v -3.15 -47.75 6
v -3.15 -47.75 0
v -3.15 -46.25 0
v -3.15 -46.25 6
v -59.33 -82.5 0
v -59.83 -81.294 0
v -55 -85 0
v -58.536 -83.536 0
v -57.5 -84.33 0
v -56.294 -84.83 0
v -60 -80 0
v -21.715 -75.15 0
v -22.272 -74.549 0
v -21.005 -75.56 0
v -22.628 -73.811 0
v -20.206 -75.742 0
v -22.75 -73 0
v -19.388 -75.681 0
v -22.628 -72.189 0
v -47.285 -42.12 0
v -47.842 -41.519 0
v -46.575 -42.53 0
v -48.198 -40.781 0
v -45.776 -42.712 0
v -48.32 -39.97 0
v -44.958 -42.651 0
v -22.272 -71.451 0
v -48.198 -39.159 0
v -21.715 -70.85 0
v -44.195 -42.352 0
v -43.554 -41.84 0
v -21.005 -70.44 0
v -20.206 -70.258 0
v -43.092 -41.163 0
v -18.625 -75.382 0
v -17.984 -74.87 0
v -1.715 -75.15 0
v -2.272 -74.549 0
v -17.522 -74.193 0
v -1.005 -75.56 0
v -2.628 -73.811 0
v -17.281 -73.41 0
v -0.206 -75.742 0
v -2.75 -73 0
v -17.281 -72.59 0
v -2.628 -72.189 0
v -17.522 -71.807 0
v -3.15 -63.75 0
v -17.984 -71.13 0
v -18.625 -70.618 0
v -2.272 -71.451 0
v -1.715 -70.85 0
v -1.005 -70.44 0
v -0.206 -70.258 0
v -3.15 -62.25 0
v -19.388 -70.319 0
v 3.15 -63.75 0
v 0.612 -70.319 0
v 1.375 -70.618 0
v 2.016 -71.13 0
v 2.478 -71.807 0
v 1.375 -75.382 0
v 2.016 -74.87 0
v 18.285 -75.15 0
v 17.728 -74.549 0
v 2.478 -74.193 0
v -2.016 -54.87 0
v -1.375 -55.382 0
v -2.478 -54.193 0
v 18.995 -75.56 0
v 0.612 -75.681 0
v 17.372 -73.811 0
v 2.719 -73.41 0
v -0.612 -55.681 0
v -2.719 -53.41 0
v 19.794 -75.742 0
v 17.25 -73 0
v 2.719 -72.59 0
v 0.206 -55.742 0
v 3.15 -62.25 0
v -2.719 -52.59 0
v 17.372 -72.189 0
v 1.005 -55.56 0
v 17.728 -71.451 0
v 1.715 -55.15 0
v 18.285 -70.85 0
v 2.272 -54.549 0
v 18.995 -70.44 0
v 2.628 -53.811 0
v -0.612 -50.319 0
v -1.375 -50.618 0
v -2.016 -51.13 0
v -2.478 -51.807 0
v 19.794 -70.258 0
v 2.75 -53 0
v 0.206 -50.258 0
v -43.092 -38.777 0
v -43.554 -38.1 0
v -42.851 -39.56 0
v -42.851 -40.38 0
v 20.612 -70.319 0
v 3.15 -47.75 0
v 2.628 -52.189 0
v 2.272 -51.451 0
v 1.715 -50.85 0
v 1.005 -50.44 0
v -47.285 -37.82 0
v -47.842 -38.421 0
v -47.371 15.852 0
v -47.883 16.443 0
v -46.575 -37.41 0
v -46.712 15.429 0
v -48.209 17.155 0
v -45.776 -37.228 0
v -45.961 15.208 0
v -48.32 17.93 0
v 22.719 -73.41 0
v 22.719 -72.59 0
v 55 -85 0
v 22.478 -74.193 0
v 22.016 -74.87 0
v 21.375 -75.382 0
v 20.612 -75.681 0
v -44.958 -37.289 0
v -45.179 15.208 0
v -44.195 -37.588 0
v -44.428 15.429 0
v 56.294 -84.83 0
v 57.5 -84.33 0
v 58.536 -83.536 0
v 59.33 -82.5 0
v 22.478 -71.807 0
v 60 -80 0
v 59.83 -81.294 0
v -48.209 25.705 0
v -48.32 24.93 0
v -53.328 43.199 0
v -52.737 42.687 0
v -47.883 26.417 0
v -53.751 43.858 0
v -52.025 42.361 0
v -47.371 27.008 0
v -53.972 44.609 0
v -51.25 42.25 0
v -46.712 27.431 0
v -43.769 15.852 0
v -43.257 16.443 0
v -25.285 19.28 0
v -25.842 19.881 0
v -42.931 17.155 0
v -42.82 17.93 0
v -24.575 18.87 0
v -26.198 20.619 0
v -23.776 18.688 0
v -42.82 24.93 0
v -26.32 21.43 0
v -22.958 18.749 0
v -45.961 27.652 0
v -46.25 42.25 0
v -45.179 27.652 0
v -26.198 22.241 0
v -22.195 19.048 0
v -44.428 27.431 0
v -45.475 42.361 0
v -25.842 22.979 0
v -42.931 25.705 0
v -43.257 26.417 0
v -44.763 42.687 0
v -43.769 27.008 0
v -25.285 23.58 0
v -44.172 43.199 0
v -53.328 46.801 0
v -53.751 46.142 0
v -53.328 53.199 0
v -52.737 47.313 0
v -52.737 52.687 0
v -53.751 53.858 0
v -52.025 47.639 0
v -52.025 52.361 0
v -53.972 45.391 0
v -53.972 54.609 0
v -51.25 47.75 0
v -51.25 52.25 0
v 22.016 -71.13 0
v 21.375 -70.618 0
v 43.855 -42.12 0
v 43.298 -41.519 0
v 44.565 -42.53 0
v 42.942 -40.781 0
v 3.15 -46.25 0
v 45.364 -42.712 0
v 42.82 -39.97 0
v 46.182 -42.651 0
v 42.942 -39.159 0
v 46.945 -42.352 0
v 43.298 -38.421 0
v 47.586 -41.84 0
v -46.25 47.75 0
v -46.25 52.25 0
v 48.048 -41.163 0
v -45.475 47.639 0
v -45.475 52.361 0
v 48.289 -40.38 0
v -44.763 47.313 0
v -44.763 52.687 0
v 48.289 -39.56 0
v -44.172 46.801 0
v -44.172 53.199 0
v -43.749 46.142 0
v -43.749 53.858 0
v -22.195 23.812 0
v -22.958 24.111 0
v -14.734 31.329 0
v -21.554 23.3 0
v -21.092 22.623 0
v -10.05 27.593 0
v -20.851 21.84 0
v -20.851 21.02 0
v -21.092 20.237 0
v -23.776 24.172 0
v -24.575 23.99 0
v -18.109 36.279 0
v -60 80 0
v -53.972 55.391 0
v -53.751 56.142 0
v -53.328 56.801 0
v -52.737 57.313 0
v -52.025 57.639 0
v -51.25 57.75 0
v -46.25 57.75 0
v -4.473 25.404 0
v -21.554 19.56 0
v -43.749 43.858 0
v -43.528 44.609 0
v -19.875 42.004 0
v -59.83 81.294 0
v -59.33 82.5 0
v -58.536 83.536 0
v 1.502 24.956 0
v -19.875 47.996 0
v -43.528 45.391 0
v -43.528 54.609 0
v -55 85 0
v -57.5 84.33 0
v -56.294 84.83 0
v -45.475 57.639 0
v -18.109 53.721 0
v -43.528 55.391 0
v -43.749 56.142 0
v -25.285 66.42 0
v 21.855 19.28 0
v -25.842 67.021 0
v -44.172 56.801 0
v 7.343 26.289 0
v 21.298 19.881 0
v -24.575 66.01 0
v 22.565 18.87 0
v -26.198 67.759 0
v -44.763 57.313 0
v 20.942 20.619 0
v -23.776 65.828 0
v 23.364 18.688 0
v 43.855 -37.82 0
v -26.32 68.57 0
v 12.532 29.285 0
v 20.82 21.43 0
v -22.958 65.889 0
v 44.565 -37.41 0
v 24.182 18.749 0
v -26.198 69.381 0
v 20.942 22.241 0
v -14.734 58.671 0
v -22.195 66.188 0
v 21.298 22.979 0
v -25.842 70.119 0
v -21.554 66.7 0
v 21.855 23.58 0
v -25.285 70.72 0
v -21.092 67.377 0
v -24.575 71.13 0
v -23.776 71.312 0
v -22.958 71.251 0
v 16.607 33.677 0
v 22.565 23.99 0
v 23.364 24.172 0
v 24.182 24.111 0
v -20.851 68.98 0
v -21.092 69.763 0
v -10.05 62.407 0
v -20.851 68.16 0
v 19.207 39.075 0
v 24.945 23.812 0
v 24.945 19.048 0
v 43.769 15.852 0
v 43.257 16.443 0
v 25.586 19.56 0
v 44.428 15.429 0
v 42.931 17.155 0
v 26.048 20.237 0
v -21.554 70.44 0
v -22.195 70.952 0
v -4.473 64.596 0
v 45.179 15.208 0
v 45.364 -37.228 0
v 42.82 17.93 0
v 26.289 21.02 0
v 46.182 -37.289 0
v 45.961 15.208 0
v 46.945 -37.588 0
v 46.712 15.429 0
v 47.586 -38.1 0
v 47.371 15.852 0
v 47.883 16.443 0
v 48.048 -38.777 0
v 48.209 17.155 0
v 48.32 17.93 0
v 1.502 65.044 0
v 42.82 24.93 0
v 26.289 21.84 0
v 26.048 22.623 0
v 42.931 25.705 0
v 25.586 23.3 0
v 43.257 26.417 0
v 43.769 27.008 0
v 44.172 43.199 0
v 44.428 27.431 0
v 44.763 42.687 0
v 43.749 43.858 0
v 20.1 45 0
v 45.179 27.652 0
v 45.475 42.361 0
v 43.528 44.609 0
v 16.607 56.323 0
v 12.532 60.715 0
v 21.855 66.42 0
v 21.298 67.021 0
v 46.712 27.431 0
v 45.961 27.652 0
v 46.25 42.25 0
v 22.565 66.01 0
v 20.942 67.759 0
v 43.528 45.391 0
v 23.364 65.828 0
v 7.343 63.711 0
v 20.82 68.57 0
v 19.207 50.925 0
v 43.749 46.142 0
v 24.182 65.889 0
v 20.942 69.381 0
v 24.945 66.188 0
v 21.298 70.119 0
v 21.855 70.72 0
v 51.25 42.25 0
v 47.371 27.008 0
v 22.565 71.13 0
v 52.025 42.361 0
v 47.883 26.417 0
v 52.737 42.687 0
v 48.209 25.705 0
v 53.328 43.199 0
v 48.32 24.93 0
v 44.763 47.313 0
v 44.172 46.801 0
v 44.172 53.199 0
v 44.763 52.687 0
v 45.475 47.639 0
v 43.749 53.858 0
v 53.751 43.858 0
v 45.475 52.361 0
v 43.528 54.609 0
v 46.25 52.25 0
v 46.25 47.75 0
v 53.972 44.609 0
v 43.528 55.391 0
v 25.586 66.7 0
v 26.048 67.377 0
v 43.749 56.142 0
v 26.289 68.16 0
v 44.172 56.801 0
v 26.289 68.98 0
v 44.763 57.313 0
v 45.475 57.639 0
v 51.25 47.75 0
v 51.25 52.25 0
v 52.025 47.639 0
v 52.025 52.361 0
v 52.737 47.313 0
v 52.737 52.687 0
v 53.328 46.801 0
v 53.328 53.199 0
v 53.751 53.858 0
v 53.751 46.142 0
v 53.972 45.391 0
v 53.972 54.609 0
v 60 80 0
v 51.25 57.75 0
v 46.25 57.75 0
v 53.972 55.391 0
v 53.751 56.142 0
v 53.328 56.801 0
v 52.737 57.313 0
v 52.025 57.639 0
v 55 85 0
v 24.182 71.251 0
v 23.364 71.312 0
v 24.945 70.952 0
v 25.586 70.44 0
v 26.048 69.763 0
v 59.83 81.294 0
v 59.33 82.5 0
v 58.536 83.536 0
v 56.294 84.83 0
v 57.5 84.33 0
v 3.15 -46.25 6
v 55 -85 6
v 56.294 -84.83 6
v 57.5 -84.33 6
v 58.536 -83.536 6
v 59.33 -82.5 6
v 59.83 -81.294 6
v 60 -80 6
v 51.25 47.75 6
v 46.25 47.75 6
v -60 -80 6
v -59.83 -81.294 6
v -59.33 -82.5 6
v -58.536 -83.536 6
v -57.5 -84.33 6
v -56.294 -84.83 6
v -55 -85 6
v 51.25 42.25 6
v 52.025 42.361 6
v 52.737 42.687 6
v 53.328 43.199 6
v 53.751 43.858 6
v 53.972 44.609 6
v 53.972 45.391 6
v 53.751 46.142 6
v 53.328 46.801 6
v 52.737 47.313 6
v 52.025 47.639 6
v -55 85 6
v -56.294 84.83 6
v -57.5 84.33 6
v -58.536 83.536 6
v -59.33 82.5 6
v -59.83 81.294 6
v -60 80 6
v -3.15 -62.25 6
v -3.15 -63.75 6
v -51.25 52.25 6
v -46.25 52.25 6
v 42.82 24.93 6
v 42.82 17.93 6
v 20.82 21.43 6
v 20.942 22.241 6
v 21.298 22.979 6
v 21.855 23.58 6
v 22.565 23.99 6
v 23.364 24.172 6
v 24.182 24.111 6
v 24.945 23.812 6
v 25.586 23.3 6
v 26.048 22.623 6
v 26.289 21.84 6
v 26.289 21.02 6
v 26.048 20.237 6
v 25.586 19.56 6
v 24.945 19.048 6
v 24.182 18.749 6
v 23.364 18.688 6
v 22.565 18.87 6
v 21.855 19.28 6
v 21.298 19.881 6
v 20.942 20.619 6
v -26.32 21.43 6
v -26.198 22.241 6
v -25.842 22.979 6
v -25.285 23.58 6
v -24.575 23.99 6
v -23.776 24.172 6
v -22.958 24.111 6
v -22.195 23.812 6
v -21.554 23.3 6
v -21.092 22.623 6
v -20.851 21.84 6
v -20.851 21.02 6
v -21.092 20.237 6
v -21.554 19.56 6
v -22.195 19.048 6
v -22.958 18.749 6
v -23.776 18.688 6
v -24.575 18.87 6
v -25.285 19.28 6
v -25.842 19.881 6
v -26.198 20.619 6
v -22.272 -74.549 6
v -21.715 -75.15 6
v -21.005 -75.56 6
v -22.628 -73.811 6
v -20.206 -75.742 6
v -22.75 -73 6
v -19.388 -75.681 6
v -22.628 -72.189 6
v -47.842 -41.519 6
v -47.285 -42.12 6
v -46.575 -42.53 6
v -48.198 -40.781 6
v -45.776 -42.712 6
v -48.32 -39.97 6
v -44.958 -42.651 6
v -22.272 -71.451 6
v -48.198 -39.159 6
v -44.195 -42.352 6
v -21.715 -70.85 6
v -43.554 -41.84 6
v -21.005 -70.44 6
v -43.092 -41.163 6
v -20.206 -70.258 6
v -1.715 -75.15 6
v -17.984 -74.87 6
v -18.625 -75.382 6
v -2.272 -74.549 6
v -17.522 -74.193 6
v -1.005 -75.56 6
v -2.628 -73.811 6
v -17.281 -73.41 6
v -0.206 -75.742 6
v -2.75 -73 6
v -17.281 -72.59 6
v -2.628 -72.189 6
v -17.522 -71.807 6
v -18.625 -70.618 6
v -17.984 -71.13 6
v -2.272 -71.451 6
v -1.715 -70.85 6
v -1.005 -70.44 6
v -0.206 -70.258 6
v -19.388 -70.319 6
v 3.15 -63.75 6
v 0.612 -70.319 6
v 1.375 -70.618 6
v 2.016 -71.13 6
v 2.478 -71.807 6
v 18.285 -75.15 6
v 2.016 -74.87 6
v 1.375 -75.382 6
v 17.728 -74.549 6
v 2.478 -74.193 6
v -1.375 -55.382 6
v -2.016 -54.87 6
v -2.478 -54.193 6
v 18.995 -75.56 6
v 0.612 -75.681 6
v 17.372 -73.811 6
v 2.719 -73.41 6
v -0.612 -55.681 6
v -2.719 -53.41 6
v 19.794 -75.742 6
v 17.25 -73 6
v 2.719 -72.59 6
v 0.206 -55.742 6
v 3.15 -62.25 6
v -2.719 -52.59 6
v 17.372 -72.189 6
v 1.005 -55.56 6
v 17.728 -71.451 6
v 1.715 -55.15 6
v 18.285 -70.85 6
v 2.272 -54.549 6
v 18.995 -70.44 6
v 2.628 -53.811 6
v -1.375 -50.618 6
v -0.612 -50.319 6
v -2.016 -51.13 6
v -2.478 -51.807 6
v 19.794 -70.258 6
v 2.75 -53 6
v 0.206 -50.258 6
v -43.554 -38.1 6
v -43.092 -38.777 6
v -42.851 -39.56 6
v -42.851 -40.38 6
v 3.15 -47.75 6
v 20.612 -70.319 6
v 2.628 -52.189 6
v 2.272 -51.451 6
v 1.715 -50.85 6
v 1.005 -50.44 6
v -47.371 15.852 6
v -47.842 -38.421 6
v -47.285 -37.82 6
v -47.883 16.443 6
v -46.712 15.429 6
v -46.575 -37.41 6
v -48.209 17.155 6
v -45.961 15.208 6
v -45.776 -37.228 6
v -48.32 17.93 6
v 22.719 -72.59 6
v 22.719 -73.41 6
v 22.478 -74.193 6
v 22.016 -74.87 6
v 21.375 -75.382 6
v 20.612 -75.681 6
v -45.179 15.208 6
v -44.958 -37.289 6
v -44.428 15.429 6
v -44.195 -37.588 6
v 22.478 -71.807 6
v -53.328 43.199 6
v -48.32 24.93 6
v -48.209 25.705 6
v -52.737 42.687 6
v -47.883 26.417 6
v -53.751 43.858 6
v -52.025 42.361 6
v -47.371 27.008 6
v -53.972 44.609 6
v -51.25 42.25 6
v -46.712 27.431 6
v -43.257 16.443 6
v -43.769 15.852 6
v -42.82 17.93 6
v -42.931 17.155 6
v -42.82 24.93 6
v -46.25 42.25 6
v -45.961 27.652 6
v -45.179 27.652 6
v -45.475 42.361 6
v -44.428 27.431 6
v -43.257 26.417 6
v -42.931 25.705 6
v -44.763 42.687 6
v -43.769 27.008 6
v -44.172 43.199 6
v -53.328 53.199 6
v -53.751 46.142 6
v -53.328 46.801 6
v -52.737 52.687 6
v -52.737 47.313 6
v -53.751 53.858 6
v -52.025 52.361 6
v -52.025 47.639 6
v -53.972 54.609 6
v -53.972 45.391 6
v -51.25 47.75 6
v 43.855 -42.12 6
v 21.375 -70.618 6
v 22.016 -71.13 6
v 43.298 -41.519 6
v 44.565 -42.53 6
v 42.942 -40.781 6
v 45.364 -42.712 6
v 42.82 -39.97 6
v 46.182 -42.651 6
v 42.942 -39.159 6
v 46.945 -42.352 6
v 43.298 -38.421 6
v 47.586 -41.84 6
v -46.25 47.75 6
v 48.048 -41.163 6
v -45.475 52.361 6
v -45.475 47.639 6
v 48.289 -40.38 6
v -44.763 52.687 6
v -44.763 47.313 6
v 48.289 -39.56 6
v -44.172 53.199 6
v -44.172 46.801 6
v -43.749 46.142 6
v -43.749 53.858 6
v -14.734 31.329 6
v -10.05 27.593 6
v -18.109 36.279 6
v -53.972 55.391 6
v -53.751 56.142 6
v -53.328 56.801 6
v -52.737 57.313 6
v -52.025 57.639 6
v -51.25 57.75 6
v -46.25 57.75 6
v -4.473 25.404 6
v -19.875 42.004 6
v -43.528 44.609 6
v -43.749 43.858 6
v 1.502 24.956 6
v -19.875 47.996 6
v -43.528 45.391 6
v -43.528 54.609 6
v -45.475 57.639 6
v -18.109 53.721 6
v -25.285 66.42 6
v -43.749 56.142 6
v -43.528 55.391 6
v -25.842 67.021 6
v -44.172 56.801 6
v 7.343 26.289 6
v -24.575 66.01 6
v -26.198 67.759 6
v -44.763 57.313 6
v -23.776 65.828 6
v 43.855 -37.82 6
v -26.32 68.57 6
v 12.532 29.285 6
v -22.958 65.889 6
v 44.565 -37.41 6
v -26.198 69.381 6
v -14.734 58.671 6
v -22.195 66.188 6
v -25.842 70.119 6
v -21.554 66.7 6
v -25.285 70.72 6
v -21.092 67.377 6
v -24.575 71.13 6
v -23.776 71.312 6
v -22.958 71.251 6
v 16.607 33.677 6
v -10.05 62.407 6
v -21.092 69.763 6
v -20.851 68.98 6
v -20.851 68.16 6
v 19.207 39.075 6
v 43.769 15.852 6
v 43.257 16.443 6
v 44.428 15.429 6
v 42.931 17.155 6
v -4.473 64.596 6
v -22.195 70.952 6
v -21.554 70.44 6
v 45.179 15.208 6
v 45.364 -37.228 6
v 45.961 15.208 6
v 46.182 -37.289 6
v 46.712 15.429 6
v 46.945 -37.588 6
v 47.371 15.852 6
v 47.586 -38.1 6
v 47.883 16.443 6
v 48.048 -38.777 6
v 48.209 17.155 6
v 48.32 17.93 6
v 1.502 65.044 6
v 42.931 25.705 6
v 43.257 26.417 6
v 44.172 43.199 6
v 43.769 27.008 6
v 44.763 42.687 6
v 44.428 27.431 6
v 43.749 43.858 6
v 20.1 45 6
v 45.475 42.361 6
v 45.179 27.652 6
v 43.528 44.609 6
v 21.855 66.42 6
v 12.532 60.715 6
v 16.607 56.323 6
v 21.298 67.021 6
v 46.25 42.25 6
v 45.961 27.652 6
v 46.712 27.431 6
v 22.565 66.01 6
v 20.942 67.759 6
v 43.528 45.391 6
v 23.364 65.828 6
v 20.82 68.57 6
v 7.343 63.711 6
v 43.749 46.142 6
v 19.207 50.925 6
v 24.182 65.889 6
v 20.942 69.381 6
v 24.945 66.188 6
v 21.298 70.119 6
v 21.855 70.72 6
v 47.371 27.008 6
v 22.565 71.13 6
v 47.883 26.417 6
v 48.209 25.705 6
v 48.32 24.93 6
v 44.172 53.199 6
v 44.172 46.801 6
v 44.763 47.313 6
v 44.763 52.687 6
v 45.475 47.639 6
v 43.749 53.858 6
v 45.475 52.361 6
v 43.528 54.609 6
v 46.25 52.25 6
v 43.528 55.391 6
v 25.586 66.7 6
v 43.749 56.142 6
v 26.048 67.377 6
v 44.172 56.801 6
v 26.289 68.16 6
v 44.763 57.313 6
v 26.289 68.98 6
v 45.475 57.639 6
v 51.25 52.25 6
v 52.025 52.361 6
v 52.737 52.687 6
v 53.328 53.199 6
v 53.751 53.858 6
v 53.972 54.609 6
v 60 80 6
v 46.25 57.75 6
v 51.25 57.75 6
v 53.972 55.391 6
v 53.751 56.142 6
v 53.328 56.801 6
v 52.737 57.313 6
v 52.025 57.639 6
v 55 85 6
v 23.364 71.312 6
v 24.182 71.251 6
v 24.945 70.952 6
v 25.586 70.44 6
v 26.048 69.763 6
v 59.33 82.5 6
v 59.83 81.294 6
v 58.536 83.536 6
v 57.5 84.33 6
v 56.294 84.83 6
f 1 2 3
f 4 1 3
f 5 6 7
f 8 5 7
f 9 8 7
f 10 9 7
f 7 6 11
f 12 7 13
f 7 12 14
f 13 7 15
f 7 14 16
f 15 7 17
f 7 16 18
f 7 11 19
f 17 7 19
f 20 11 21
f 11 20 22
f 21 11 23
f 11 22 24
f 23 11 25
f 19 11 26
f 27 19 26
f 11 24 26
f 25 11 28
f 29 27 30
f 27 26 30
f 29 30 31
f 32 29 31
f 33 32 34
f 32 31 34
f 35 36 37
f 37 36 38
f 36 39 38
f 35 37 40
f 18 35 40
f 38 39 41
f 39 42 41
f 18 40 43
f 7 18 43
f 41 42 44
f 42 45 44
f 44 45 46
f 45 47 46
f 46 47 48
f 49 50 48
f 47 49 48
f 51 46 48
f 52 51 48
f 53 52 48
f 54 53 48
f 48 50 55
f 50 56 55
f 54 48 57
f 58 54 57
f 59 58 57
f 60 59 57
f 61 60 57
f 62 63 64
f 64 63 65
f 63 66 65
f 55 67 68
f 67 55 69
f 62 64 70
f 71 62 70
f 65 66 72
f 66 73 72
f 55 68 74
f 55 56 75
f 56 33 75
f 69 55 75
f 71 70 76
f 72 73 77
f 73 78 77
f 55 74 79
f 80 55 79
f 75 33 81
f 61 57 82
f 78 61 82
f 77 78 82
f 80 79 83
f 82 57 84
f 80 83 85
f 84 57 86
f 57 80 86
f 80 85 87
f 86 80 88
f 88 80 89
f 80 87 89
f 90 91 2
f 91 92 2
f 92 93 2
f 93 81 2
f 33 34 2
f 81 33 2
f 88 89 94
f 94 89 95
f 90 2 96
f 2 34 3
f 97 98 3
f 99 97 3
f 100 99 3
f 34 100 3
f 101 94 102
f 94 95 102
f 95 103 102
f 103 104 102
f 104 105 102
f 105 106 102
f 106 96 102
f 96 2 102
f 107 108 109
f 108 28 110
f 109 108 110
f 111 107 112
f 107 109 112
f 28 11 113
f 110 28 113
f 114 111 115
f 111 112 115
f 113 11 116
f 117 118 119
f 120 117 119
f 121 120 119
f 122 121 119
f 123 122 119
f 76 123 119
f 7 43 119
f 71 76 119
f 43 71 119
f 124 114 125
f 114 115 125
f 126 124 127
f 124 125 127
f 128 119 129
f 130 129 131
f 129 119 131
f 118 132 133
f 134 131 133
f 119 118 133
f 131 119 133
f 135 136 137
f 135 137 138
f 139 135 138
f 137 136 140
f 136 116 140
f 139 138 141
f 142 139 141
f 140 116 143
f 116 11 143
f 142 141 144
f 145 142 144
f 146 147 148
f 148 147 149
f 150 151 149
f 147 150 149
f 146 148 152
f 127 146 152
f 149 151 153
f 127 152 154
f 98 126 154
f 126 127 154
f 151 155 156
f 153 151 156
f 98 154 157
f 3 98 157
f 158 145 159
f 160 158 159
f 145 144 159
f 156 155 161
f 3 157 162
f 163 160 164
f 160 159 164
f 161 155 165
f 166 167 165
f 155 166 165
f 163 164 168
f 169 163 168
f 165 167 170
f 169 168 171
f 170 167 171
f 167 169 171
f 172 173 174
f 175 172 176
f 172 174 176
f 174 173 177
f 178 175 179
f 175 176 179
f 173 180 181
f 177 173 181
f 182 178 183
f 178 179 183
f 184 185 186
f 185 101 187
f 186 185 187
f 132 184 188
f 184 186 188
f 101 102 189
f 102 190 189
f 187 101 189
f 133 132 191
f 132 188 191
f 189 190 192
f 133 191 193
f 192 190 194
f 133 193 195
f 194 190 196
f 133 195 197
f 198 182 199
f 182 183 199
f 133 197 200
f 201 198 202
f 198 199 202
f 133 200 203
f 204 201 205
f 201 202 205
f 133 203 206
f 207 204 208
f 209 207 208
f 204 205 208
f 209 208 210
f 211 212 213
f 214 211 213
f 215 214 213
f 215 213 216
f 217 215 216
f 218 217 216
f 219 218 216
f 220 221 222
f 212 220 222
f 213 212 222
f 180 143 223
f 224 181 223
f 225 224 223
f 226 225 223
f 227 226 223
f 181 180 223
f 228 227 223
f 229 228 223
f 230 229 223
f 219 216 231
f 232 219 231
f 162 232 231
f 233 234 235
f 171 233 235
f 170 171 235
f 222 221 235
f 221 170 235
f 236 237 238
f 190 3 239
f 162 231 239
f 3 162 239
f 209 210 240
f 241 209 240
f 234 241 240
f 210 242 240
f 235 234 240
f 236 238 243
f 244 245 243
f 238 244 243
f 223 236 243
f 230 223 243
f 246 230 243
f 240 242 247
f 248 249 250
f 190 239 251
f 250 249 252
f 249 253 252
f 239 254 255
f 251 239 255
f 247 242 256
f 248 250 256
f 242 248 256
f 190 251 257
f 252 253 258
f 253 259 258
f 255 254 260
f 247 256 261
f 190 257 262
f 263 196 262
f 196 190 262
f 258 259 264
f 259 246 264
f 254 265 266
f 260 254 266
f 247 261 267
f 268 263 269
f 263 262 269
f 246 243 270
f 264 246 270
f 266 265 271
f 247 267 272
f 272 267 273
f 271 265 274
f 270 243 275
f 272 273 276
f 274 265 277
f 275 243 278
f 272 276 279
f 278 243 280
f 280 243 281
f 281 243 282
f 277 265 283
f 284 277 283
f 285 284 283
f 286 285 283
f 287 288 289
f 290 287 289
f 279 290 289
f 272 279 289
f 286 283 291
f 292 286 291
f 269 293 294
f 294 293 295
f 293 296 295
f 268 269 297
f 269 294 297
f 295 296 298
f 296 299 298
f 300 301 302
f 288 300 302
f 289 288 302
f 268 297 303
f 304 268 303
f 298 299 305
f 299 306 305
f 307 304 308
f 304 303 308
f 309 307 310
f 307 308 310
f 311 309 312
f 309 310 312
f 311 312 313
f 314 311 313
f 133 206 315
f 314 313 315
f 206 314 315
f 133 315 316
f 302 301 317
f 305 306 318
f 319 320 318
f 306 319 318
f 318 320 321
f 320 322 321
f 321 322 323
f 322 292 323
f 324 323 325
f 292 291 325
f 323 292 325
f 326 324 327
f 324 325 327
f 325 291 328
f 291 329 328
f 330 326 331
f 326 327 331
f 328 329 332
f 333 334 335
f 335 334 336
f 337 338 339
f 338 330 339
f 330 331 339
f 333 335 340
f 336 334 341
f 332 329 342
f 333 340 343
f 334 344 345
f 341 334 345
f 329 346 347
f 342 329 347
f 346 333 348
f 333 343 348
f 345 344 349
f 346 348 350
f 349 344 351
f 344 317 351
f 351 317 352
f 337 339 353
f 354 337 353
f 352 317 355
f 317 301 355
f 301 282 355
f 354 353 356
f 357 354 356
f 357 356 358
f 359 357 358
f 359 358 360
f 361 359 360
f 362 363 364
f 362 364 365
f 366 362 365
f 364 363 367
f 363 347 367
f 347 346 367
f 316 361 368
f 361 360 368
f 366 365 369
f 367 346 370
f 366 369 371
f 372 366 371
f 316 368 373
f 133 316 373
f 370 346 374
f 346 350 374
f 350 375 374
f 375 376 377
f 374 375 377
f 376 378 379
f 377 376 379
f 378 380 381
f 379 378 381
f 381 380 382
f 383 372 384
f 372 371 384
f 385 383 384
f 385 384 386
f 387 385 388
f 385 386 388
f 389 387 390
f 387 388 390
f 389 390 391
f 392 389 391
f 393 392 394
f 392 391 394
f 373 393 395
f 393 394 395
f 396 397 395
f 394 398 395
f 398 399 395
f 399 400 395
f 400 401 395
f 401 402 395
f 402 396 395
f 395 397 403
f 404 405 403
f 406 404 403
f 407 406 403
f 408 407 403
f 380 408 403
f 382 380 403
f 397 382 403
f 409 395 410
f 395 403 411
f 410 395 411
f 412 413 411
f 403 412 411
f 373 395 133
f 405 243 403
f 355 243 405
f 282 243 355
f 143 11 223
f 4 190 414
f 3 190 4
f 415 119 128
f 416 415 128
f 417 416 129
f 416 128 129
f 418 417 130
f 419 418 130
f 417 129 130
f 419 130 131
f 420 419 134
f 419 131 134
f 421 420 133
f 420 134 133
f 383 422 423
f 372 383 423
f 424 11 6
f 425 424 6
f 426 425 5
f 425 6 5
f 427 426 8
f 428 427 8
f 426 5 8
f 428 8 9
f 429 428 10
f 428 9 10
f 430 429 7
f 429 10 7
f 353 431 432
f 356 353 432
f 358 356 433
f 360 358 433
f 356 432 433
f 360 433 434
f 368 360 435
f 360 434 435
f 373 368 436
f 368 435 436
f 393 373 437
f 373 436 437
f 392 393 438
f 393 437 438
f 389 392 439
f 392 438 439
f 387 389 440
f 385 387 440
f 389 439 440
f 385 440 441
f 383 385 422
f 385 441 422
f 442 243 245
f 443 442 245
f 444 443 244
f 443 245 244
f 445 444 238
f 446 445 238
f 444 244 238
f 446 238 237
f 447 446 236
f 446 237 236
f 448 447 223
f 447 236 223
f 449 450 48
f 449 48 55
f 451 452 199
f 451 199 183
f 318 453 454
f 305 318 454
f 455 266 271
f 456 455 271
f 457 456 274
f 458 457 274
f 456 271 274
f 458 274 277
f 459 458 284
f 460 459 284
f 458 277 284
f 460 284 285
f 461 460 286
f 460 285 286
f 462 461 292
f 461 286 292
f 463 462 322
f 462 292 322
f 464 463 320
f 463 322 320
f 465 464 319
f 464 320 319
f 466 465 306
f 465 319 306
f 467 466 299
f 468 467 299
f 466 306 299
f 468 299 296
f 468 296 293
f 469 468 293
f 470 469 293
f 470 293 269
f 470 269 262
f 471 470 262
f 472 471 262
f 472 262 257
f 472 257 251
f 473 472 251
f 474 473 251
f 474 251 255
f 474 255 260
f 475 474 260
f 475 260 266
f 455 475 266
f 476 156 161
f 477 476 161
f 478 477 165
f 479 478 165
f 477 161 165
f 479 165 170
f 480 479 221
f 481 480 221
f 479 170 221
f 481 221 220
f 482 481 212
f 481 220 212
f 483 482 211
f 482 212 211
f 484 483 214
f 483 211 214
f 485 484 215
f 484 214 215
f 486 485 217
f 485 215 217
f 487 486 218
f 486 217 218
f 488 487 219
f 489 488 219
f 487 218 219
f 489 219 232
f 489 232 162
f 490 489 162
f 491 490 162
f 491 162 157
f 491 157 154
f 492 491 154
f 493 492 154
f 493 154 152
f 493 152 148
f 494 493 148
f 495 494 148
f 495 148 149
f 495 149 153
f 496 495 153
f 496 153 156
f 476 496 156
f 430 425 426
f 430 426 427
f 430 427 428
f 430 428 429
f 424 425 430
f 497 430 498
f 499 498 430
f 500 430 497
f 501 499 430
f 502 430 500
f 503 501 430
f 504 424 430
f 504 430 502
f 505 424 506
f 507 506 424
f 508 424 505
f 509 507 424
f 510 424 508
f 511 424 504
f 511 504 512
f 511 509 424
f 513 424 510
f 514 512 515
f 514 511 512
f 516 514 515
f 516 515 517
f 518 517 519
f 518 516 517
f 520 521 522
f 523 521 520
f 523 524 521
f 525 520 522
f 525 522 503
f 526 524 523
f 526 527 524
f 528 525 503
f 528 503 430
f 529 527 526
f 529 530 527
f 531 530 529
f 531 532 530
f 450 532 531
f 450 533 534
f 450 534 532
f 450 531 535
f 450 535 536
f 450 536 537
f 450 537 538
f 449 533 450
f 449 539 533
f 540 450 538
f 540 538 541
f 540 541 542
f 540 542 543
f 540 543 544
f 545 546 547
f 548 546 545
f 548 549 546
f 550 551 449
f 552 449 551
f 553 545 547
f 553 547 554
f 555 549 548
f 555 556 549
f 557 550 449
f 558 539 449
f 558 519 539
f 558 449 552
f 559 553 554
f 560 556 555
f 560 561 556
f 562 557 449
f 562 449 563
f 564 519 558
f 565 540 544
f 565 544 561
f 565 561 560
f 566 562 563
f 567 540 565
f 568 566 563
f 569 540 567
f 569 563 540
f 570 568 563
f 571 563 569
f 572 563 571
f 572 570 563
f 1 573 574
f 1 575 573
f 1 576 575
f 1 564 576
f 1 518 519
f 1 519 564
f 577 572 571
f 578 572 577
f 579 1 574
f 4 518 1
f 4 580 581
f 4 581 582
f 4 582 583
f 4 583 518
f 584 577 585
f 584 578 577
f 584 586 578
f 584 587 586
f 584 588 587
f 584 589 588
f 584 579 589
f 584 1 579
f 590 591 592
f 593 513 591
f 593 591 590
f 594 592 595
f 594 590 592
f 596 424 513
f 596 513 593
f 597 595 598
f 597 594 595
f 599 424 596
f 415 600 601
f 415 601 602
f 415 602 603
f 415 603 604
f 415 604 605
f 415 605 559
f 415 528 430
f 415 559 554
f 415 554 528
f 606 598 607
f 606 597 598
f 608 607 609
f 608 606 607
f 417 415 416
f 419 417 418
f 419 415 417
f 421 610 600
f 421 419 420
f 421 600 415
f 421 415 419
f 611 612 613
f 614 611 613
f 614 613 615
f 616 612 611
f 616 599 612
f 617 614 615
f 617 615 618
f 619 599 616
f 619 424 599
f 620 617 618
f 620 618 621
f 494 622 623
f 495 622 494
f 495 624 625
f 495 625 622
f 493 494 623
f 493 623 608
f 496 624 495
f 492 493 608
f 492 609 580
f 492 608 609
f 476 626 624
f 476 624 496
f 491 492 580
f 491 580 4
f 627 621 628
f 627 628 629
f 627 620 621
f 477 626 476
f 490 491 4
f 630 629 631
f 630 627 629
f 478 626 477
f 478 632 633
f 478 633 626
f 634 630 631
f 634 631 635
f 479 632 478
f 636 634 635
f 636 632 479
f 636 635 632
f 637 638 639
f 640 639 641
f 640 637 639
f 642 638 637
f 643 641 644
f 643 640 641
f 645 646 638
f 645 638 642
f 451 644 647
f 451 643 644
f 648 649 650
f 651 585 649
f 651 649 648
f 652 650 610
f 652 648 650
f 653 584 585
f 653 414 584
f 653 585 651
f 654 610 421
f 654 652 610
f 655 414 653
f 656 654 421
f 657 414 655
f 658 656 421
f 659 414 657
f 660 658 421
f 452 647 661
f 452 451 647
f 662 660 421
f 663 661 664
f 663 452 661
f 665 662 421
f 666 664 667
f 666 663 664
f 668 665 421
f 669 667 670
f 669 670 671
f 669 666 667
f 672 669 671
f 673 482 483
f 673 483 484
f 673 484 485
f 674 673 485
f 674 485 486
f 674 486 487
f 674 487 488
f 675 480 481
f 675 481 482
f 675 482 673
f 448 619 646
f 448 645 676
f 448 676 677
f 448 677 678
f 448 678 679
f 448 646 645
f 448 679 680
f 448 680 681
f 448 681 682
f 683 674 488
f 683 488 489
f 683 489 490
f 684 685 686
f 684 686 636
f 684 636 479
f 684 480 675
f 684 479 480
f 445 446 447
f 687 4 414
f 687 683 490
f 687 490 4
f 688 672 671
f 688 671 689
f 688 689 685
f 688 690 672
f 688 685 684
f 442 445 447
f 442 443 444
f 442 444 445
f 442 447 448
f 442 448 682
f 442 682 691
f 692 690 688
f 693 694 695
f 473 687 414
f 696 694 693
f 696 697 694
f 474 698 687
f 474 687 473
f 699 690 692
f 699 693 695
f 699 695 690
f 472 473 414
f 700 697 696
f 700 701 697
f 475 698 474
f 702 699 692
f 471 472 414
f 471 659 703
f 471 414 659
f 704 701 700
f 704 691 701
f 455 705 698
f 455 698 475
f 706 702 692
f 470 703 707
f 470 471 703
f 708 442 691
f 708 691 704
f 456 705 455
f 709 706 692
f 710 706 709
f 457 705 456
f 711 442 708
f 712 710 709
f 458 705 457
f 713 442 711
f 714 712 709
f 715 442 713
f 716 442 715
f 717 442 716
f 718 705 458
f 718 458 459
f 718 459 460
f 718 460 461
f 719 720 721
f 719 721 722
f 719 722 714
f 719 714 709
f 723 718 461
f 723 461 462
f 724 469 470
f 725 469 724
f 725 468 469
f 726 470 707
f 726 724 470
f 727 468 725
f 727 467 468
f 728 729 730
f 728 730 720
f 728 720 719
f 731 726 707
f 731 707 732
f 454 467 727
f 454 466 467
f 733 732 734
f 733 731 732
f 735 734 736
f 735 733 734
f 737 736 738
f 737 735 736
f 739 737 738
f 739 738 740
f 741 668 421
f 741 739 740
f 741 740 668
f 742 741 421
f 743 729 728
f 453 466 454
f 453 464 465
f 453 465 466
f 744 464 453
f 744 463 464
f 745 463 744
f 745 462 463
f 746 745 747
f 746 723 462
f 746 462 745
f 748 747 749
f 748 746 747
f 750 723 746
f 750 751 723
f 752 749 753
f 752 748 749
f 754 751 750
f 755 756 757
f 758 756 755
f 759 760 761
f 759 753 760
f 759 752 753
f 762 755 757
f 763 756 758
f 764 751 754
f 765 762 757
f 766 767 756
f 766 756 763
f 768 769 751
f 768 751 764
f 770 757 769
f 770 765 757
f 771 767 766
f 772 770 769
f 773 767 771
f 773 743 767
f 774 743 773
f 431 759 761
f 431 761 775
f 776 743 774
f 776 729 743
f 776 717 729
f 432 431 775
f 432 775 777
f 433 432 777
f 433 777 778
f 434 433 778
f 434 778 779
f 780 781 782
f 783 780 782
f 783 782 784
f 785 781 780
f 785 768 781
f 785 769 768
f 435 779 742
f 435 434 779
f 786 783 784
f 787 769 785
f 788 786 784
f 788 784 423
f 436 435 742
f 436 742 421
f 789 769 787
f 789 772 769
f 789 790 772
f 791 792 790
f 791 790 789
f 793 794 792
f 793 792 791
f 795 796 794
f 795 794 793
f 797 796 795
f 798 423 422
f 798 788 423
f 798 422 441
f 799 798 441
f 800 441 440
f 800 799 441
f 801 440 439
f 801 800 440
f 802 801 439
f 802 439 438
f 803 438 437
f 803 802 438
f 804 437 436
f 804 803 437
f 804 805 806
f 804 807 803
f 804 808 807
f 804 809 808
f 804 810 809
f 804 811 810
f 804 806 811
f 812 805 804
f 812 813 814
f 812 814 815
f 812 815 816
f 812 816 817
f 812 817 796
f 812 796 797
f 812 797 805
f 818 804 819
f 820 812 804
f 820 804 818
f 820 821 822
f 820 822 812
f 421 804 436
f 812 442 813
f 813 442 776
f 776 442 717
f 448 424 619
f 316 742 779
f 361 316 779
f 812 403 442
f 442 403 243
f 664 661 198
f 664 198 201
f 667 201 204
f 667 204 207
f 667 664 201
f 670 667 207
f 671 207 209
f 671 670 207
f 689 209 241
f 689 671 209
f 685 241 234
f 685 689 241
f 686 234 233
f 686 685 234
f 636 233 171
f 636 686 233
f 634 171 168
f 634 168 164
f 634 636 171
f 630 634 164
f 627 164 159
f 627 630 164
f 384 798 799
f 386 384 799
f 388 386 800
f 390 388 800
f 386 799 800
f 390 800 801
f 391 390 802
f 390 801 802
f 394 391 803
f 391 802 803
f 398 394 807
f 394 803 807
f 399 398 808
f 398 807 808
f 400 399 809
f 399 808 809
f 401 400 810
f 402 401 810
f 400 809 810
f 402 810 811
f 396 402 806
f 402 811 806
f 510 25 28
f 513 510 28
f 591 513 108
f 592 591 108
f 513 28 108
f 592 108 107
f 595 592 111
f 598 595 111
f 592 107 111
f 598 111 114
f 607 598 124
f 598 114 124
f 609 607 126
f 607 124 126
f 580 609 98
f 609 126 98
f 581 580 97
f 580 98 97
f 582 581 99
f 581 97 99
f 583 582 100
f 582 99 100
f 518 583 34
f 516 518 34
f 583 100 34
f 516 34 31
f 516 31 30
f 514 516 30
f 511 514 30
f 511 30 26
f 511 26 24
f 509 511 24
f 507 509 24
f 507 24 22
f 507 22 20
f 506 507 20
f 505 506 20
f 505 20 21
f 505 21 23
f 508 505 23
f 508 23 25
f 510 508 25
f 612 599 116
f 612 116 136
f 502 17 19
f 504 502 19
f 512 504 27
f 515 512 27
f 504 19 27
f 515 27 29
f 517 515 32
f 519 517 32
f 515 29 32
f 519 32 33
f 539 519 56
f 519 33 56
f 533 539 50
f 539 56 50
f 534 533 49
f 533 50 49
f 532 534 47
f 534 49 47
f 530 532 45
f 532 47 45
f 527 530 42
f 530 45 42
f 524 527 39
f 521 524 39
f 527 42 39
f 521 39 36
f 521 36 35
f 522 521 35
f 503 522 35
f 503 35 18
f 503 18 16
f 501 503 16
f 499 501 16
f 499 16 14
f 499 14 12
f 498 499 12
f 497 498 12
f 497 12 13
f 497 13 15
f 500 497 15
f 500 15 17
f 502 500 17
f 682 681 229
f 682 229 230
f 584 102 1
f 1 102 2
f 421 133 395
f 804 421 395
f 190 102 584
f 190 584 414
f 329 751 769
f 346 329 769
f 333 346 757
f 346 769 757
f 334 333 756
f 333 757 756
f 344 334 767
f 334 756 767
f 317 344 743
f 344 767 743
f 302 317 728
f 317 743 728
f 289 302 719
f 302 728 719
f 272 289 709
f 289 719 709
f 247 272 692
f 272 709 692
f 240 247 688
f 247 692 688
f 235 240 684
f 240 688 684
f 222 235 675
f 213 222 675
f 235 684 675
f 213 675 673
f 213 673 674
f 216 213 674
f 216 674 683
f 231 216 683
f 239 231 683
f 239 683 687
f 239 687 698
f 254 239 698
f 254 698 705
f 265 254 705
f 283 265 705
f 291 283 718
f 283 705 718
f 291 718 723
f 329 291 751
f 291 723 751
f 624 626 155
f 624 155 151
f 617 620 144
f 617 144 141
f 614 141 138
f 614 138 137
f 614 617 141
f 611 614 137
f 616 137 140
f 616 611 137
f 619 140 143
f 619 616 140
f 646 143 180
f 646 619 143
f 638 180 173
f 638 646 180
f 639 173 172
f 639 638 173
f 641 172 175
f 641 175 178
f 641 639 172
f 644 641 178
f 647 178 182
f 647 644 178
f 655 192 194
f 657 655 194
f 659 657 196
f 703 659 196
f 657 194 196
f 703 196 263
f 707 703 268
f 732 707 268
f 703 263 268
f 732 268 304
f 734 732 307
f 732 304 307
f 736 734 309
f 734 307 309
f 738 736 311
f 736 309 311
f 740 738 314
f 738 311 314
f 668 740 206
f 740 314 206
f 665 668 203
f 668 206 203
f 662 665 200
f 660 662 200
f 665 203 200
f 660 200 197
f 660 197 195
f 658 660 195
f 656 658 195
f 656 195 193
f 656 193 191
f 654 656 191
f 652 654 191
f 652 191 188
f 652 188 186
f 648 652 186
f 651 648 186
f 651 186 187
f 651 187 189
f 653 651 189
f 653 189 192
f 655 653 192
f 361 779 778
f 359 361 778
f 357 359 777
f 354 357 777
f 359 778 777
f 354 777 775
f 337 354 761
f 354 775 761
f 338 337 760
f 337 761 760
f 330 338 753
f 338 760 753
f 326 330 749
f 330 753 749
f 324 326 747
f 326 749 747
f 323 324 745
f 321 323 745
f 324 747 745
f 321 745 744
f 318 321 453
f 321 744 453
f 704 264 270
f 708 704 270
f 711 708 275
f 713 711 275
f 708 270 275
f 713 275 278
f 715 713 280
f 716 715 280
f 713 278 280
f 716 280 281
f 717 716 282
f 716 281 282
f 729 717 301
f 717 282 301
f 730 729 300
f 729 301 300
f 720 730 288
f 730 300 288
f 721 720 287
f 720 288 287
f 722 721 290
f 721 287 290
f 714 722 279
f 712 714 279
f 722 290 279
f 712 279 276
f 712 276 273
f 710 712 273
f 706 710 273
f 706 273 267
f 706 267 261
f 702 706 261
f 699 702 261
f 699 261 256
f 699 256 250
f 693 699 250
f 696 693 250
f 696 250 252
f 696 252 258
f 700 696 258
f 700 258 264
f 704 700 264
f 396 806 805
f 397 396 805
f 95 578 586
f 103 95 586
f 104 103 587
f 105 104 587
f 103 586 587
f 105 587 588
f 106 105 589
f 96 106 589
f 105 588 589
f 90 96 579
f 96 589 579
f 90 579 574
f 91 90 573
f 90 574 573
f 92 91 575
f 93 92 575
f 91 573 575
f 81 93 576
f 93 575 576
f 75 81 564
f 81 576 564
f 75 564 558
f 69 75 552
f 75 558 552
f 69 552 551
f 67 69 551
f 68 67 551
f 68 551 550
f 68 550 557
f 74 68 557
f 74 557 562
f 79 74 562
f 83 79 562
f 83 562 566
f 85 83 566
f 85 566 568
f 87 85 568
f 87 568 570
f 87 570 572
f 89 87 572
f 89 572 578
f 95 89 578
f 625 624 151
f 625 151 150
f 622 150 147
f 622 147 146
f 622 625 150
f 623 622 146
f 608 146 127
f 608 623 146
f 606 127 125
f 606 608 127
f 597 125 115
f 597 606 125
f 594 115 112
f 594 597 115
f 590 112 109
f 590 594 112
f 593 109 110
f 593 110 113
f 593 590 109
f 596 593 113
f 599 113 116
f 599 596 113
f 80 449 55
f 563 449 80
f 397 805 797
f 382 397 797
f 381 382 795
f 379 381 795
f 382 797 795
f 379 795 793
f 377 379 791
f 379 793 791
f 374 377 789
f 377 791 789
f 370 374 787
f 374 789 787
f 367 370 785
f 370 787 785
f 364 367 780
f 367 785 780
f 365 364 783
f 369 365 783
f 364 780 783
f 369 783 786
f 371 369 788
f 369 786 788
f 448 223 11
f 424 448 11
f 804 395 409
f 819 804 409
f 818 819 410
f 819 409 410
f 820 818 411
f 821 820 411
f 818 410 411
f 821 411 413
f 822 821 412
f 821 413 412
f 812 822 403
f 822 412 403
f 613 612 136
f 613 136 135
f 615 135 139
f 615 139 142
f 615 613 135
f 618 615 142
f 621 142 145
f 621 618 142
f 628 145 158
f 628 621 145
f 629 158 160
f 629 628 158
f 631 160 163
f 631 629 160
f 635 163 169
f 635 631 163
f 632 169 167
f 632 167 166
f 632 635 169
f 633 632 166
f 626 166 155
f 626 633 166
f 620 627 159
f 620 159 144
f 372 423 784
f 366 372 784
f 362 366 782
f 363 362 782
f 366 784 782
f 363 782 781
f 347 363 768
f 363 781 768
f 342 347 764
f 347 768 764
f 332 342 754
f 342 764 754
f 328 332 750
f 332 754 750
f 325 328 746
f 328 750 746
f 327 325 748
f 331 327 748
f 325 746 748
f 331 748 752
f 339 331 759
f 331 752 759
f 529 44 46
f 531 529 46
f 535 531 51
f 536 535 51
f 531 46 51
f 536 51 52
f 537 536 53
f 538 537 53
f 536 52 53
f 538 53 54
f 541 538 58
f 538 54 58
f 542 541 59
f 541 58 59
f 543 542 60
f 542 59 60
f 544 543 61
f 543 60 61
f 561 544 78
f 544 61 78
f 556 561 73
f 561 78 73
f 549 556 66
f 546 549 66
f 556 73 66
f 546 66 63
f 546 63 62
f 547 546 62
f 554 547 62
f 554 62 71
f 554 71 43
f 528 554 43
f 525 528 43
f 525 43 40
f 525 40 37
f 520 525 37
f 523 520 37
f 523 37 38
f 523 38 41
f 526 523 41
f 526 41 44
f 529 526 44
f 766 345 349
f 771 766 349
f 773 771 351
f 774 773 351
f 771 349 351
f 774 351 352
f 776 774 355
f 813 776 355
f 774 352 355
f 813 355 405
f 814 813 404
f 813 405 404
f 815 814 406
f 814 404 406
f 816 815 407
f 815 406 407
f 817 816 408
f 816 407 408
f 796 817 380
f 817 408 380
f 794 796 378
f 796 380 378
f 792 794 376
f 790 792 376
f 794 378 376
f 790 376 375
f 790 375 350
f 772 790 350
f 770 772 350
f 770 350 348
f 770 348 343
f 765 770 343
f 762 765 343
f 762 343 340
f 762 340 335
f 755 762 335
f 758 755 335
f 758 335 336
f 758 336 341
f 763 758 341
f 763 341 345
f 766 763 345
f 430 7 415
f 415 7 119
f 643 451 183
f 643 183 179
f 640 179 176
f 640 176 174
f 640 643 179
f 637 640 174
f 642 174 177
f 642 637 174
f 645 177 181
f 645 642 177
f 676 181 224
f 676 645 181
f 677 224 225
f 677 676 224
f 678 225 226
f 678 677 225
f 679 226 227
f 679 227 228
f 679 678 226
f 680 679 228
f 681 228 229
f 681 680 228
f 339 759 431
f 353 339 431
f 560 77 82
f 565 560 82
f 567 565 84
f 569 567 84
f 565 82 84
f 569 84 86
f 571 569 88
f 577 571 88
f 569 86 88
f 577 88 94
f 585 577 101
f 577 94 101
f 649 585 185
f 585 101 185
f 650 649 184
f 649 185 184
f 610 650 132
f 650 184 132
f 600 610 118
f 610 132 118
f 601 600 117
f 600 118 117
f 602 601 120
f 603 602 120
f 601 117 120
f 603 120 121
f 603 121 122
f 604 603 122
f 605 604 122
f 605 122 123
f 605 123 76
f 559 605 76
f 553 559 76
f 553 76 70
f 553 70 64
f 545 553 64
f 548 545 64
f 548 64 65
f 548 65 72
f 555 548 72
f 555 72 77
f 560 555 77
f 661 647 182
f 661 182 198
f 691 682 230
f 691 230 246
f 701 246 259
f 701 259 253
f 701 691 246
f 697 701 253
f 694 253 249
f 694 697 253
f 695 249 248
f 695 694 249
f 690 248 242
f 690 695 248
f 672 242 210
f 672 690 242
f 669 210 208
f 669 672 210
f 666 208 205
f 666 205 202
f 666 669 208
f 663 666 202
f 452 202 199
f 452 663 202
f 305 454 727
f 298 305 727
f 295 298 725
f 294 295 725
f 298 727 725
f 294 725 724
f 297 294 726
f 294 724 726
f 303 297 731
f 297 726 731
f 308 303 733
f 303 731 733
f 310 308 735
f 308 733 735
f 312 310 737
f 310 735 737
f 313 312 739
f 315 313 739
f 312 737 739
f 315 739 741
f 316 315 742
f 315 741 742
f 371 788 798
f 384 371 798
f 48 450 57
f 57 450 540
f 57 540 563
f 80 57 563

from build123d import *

# Parameters (mm, degrees)
BOSS_EXTRUDE1_DEPTH      = 6
SKETCH3_R                = 20.1
CUT_EXTRUDE1_DEPTH       = 6
M5_CLEARANCE_HOLE1_D     = 5.5
CUT_EXTRUDE2_DEPTH       = 6
CUT_EXTRUDE4_DEPTH       = 6
M5_CLEARANCE_HOLE3_D     = 5.5
M5_CLEARANCE_HOLE2_D     = 5.5
M5_CLEARANCE_HOLE2_DEPTH = 10
M5_CLEARANCE_HOLE2_TIP   = 1.652366702
SKETCH21_W               = 6.3
SKETCH21_H               = 1.5
CUT_EXTRUDE5_DEPTH       = 6
SKETCH22_W               = 6.3
SKETCH22_H               = 1.5
CUT_EXTRUDE6_DEPTH       = 10


with BuildPart() as part:
    # Sketch1 → Boss-Extrude1 (new body)
    with BuildSketch(Plane.XY):
        with BuildLine():
            Line((-55, -85), (55, -85))
            ThreePointArc((55, -85), (58.535533906, -83.535533906), (60, -80))
            Line((60, -80), (60, 80))
            ThreePointArc((60, 80), (58.535533906, 83.535533906), (55, 85))
            Line((55, 85), (-55, 85))
            ThreePointArc((-55, 85), (-58.535533906, 83.535533906), (-60, 80))
            Line((-60, 80), (-60, -80))
            ThreePointArc((-60, -80), (-58.535533906, -83.535533906), (-55, -85))
        make_face()
    extrude(amount=BOSS_EXTRUDE1_DEPTH)

    # Sketch3 → Cut-Extrude1 (cut)
    with BuildSketch(Plane.XY.offset(6)):
        with Locations((0, 45)):
            Circle(SKETCH3_R)
    extrude(amount=-CUT_EXTRUDE1_DEPTH, mode=Mode.SUBTRACT)

    # M5 Clearance Hole1 (through all)
    with Locations(Plane.XY.offset(6)):
        with Locations((-23.57, 68.57), (23.57, 68.57), (23.57, 21.43), (-23.57, 21.43)):
            Hole(M5_CLEARANCE_HOLE1_D / 2)

    # Sketch11 → Cut-Extrude2 (cut)
    with BuildSketch(Plane.XY.offset(6)):
        with BuildLine():
            Line((-42.82, 24.93), (-42.82, 17.93))
            ThreePointArc((-42.82, 17.93), (-45.57, 15.18), (-48.32, 17.93))
            Line((-48.32, 17.93), (-48.32, 24.93))
            ThreePointArc((-48.32, 24.93), (-45.57, 27.68), (-42.82, 24.93))
        make_face()
        with BuildLine():
            Line((42.82, 24.93), (42.82, 17.93))
            ThreePointArc((42.82, 17.93), (45.57, 15.18), (48.32, 17.93))
            Line((48.32, 17.93), (48.32, 24.93))
            ThreePointArc((48.32, 24.93), (45.57, 27.68), (42.82, 24.93))
        make_face()
    extrude(amount=-CUT_EXTRUDE2_DEPTH, mode=Mode.SUBTRACT)

    # Sketch15 → Cut-Extrude4 (cut)
    with BuildSketch(Plane.XY.offset(6)):
        with BuildLine():
            Line((-51.25, 47.75), (-46.25, 47.75))
            ThreePointArc((-46.25, 47.75), (-43.5, 45), (-46.25, 42.25))
            Line((-46.25, 42.25), (-51.25, 42.25))
            ThreePointArc((-51.25, 42.25), (-54, 45), (-51.25, 47.75))
        make_face()
        with BuildLine():
            Line((-51.25, 57.75), (-46.25, 57.75))
            ThreePointArc((-46.25, 57.75), (-43.5, 55), (-46.25, 52.25))
            Line((-46.25, 52.25), (-51.25, 52.25))
            ThreePointArc((-51.25, 52.25), (-54, 55), (-51.25, 57.75))
        make_face()
        with BuildLine():
            Line((51.25, 47.75), (46.25, 47.75))
            ThreePointArc((46.25, 47.75), (43.5, 45), (46.25, 42.25))
            Line((46.25, 42.25), (51.25, 42.25))
            ThreePointArc((51.25, 42.25), (54, 45), (51.25, 47.75))
        make_face()
        with BuildLine():
            Line((51.25, 57.75), (46.25, 57.75))
            ThreePointArc((46.25, 57.75), (43.5, 55), (46.25, 52.25))
            Line((46.25, 52.25), (51.25, 52.25))
            ThreePointArc((51.25, 52.25), (54, 55), (51.25, 57.75))
        make_face()
    extrude(amount=-CUT_EXTRUDE4_DEPTH, mode=Mode.SUBTRACT)

    # M5 Clearance Hole3 (through all)
    with Locations(Plane.XY.offset(6)):
        with Locations((-45.57, -39.97), (45.57, -39.97), (20, -73), (0, -73), (-20, -73)):
            Hole(M5_CLEARANCE_HOLE3_D / 2)

    # M5 Clearance Hole2
    with Locations(Plane(origin=(0, 0, 0), x_dir=(-1, 0, 0), z_dir=(0, 0, -1))):
        with Locations((0, -53)):
            Hole(M5_CLEARANCE_HOLE2_D / 2, depth=M5_CLEARANCE_HOLE2_DEPTH)
            with Locations((0, 0, -(M5_CLEARANCE_HOLE2_DEPTH + M5_CLEARANCE_HOLE2_TIP / 2))):  # 118° drill point
                Cone(0, M5_CLEARANCE_HOLE2_D / 2, M5_CLEARANCE_HOLE2_TIP, mode=Mode.SUBTRACT)

    # Sketch21 → Cut-Extrude5 (cut)
    with BuildSketch(Plane(origin=(0, 0, 0), x_dir=(-1, 0, 0), z_dir=(0, 0, -1))):
        with Locations((0, -47)):
            Rectangle(SKETCH21_W, SKETCH21_H)
    extrude(amount=-CUT_EXTRUDE5_DEPTH, mode=Mode.SUBTRACT)

    # Sketch22 → Cut-Extrude6 (cut)
    with BuildSketch(Plane.XY.offset(6)):
        with Locations((0, -63)):
            Rectangle(SKETCH22_W, SKETCH22_H)
    extrude(amount=-CUT_EXTRUDE6_DEPTH, mode=Mode.SUBTRACT)


solid = part.part
